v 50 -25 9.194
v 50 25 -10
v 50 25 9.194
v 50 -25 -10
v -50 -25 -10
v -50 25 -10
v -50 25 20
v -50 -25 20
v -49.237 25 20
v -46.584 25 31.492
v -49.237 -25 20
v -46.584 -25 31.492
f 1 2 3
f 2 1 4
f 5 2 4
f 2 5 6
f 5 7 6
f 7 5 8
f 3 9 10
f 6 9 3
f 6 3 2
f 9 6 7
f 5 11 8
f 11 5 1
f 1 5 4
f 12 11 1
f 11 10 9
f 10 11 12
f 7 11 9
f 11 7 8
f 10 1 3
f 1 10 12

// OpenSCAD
    
difference(){    
difference(){    
difference(){      
union(){   
translate([-45,0,10])
cube(size = [10,50,20], center = true);    
    
union(){    
cube(size = [100,50,20], center = true);
translate([0,0,11])
rotate([0,13,0])
cube(size = [100,50,20], center = true);
    
}
}
translate([0,0,31])
rotate([0,13,0])
cube(size = [120,51,20], center = true);
}
translate([55,0,0])
cube( size = [10,51,50] , center = true);
}
translate([-55,0,0])
cube( size = [10,51,50] , center = true);
}
